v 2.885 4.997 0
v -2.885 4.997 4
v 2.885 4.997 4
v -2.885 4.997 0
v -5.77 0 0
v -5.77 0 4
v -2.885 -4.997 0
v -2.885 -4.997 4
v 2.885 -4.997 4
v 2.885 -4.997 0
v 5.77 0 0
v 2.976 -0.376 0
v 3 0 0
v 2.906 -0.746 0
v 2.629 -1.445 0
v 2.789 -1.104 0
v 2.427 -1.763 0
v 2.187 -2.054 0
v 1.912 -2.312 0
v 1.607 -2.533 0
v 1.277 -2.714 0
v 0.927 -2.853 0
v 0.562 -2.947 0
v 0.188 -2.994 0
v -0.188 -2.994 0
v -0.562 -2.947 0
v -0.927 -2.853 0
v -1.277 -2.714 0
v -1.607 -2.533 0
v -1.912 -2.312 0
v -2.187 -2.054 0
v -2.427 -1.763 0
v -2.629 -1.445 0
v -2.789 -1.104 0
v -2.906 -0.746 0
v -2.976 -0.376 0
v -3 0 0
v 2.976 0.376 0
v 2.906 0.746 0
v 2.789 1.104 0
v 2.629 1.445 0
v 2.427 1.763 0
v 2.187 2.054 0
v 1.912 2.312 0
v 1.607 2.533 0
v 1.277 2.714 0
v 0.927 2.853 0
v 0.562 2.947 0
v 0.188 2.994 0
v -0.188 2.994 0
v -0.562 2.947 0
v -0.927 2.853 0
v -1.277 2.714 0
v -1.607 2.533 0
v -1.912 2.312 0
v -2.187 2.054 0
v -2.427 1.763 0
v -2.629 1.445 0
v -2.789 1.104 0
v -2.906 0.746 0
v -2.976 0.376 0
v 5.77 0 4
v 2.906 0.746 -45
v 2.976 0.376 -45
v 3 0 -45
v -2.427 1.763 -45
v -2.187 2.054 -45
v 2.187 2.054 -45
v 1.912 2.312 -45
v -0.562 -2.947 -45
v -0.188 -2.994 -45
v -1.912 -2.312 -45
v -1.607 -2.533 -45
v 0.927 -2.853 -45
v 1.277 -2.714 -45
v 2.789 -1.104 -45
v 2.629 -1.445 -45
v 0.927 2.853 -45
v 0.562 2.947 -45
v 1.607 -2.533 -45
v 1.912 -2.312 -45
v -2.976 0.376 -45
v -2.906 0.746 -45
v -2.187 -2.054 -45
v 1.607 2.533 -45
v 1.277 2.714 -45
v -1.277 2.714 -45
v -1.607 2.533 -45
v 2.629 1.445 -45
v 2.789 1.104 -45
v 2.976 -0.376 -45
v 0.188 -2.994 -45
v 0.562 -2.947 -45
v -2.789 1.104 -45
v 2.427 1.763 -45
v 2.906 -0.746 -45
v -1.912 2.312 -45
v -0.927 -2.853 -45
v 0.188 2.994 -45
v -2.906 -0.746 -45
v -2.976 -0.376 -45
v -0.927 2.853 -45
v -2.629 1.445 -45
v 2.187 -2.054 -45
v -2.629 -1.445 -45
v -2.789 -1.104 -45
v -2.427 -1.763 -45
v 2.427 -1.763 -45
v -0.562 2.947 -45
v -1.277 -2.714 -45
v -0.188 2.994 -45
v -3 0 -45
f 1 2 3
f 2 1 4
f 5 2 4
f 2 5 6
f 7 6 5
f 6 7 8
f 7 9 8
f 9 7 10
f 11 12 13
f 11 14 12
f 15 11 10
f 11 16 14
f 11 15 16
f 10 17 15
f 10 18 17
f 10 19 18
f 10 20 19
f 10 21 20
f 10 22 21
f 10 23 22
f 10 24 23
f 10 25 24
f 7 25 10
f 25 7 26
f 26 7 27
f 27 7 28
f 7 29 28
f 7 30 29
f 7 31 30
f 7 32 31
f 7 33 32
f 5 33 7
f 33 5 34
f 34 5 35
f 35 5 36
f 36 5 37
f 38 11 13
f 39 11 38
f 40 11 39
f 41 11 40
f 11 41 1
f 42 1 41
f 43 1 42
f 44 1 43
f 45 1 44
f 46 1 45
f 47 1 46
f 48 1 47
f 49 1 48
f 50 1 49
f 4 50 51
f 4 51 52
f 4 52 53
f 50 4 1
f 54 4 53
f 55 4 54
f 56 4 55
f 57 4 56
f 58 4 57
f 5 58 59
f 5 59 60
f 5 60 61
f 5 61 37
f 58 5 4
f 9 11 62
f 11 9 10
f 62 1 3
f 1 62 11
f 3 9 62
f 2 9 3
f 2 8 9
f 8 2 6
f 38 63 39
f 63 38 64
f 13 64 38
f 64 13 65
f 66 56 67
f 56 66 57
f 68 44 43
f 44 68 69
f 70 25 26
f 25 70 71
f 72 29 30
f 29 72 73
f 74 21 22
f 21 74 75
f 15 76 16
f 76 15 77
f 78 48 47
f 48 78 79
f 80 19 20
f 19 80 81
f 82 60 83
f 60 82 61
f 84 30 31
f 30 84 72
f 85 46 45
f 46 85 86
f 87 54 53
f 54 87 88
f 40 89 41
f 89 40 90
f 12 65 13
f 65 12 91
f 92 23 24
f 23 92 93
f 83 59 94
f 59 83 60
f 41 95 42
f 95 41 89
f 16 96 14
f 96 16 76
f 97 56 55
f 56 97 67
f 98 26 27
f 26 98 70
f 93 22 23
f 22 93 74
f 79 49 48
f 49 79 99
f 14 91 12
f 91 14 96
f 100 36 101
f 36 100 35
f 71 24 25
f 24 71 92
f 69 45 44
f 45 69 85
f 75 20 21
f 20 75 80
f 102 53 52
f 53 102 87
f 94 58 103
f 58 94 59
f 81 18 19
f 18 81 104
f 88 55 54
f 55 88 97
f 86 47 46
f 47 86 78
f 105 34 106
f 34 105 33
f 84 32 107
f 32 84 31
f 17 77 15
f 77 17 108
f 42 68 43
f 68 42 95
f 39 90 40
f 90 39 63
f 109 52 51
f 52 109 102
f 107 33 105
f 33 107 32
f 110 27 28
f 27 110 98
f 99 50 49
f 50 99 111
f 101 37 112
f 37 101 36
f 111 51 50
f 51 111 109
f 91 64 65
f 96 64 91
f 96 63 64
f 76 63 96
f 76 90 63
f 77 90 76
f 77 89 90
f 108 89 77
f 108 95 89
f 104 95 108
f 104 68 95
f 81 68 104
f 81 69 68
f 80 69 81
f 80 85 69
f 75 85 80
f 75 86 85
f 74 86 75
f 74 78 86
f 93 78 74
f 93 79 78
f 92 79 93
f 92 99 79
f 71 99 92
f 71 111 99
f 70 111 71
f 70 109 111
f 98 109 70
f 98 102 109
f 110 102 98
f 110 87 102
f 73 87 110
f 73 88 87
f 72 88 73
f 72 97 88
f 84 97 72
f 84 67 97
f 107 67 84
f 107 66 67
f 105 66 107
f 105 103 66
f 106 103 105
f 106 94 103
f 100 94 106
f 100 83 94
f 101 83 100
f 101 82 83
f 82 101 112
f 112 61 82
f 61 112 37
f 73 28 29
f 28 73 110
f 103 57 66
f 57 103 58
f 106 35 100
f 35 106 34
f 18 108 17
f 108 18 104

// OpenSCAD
$fn = 50;


difference() {
	union() {
		translate(v = [0, 0, 0]) {
			rotate(a = [0, 0, 0]) {
				translate(v = [0, 0, 0]) {
					rotate(a = [0, 0, 0]) {
						linear_extrude(height = 4) {
							polygon(points = [[5.7700000000, 0.0000000000], [2.8850000000, 4.9969665798], [-2.8850000000, 4.9969665798], [-5.7700000000, 0.0000000000], [-2.8850000000, -4.9969665798], [2.8850000000, -4.9969665798]]);
						}
					}
				}
			}
		}
		translate(v = [0, 0, -45]) {
			rotate(a = [0, 0, 0]) {
				cylinder(h = 45, r = 3.0000000000);
			}
		}
	}
	union();
}
